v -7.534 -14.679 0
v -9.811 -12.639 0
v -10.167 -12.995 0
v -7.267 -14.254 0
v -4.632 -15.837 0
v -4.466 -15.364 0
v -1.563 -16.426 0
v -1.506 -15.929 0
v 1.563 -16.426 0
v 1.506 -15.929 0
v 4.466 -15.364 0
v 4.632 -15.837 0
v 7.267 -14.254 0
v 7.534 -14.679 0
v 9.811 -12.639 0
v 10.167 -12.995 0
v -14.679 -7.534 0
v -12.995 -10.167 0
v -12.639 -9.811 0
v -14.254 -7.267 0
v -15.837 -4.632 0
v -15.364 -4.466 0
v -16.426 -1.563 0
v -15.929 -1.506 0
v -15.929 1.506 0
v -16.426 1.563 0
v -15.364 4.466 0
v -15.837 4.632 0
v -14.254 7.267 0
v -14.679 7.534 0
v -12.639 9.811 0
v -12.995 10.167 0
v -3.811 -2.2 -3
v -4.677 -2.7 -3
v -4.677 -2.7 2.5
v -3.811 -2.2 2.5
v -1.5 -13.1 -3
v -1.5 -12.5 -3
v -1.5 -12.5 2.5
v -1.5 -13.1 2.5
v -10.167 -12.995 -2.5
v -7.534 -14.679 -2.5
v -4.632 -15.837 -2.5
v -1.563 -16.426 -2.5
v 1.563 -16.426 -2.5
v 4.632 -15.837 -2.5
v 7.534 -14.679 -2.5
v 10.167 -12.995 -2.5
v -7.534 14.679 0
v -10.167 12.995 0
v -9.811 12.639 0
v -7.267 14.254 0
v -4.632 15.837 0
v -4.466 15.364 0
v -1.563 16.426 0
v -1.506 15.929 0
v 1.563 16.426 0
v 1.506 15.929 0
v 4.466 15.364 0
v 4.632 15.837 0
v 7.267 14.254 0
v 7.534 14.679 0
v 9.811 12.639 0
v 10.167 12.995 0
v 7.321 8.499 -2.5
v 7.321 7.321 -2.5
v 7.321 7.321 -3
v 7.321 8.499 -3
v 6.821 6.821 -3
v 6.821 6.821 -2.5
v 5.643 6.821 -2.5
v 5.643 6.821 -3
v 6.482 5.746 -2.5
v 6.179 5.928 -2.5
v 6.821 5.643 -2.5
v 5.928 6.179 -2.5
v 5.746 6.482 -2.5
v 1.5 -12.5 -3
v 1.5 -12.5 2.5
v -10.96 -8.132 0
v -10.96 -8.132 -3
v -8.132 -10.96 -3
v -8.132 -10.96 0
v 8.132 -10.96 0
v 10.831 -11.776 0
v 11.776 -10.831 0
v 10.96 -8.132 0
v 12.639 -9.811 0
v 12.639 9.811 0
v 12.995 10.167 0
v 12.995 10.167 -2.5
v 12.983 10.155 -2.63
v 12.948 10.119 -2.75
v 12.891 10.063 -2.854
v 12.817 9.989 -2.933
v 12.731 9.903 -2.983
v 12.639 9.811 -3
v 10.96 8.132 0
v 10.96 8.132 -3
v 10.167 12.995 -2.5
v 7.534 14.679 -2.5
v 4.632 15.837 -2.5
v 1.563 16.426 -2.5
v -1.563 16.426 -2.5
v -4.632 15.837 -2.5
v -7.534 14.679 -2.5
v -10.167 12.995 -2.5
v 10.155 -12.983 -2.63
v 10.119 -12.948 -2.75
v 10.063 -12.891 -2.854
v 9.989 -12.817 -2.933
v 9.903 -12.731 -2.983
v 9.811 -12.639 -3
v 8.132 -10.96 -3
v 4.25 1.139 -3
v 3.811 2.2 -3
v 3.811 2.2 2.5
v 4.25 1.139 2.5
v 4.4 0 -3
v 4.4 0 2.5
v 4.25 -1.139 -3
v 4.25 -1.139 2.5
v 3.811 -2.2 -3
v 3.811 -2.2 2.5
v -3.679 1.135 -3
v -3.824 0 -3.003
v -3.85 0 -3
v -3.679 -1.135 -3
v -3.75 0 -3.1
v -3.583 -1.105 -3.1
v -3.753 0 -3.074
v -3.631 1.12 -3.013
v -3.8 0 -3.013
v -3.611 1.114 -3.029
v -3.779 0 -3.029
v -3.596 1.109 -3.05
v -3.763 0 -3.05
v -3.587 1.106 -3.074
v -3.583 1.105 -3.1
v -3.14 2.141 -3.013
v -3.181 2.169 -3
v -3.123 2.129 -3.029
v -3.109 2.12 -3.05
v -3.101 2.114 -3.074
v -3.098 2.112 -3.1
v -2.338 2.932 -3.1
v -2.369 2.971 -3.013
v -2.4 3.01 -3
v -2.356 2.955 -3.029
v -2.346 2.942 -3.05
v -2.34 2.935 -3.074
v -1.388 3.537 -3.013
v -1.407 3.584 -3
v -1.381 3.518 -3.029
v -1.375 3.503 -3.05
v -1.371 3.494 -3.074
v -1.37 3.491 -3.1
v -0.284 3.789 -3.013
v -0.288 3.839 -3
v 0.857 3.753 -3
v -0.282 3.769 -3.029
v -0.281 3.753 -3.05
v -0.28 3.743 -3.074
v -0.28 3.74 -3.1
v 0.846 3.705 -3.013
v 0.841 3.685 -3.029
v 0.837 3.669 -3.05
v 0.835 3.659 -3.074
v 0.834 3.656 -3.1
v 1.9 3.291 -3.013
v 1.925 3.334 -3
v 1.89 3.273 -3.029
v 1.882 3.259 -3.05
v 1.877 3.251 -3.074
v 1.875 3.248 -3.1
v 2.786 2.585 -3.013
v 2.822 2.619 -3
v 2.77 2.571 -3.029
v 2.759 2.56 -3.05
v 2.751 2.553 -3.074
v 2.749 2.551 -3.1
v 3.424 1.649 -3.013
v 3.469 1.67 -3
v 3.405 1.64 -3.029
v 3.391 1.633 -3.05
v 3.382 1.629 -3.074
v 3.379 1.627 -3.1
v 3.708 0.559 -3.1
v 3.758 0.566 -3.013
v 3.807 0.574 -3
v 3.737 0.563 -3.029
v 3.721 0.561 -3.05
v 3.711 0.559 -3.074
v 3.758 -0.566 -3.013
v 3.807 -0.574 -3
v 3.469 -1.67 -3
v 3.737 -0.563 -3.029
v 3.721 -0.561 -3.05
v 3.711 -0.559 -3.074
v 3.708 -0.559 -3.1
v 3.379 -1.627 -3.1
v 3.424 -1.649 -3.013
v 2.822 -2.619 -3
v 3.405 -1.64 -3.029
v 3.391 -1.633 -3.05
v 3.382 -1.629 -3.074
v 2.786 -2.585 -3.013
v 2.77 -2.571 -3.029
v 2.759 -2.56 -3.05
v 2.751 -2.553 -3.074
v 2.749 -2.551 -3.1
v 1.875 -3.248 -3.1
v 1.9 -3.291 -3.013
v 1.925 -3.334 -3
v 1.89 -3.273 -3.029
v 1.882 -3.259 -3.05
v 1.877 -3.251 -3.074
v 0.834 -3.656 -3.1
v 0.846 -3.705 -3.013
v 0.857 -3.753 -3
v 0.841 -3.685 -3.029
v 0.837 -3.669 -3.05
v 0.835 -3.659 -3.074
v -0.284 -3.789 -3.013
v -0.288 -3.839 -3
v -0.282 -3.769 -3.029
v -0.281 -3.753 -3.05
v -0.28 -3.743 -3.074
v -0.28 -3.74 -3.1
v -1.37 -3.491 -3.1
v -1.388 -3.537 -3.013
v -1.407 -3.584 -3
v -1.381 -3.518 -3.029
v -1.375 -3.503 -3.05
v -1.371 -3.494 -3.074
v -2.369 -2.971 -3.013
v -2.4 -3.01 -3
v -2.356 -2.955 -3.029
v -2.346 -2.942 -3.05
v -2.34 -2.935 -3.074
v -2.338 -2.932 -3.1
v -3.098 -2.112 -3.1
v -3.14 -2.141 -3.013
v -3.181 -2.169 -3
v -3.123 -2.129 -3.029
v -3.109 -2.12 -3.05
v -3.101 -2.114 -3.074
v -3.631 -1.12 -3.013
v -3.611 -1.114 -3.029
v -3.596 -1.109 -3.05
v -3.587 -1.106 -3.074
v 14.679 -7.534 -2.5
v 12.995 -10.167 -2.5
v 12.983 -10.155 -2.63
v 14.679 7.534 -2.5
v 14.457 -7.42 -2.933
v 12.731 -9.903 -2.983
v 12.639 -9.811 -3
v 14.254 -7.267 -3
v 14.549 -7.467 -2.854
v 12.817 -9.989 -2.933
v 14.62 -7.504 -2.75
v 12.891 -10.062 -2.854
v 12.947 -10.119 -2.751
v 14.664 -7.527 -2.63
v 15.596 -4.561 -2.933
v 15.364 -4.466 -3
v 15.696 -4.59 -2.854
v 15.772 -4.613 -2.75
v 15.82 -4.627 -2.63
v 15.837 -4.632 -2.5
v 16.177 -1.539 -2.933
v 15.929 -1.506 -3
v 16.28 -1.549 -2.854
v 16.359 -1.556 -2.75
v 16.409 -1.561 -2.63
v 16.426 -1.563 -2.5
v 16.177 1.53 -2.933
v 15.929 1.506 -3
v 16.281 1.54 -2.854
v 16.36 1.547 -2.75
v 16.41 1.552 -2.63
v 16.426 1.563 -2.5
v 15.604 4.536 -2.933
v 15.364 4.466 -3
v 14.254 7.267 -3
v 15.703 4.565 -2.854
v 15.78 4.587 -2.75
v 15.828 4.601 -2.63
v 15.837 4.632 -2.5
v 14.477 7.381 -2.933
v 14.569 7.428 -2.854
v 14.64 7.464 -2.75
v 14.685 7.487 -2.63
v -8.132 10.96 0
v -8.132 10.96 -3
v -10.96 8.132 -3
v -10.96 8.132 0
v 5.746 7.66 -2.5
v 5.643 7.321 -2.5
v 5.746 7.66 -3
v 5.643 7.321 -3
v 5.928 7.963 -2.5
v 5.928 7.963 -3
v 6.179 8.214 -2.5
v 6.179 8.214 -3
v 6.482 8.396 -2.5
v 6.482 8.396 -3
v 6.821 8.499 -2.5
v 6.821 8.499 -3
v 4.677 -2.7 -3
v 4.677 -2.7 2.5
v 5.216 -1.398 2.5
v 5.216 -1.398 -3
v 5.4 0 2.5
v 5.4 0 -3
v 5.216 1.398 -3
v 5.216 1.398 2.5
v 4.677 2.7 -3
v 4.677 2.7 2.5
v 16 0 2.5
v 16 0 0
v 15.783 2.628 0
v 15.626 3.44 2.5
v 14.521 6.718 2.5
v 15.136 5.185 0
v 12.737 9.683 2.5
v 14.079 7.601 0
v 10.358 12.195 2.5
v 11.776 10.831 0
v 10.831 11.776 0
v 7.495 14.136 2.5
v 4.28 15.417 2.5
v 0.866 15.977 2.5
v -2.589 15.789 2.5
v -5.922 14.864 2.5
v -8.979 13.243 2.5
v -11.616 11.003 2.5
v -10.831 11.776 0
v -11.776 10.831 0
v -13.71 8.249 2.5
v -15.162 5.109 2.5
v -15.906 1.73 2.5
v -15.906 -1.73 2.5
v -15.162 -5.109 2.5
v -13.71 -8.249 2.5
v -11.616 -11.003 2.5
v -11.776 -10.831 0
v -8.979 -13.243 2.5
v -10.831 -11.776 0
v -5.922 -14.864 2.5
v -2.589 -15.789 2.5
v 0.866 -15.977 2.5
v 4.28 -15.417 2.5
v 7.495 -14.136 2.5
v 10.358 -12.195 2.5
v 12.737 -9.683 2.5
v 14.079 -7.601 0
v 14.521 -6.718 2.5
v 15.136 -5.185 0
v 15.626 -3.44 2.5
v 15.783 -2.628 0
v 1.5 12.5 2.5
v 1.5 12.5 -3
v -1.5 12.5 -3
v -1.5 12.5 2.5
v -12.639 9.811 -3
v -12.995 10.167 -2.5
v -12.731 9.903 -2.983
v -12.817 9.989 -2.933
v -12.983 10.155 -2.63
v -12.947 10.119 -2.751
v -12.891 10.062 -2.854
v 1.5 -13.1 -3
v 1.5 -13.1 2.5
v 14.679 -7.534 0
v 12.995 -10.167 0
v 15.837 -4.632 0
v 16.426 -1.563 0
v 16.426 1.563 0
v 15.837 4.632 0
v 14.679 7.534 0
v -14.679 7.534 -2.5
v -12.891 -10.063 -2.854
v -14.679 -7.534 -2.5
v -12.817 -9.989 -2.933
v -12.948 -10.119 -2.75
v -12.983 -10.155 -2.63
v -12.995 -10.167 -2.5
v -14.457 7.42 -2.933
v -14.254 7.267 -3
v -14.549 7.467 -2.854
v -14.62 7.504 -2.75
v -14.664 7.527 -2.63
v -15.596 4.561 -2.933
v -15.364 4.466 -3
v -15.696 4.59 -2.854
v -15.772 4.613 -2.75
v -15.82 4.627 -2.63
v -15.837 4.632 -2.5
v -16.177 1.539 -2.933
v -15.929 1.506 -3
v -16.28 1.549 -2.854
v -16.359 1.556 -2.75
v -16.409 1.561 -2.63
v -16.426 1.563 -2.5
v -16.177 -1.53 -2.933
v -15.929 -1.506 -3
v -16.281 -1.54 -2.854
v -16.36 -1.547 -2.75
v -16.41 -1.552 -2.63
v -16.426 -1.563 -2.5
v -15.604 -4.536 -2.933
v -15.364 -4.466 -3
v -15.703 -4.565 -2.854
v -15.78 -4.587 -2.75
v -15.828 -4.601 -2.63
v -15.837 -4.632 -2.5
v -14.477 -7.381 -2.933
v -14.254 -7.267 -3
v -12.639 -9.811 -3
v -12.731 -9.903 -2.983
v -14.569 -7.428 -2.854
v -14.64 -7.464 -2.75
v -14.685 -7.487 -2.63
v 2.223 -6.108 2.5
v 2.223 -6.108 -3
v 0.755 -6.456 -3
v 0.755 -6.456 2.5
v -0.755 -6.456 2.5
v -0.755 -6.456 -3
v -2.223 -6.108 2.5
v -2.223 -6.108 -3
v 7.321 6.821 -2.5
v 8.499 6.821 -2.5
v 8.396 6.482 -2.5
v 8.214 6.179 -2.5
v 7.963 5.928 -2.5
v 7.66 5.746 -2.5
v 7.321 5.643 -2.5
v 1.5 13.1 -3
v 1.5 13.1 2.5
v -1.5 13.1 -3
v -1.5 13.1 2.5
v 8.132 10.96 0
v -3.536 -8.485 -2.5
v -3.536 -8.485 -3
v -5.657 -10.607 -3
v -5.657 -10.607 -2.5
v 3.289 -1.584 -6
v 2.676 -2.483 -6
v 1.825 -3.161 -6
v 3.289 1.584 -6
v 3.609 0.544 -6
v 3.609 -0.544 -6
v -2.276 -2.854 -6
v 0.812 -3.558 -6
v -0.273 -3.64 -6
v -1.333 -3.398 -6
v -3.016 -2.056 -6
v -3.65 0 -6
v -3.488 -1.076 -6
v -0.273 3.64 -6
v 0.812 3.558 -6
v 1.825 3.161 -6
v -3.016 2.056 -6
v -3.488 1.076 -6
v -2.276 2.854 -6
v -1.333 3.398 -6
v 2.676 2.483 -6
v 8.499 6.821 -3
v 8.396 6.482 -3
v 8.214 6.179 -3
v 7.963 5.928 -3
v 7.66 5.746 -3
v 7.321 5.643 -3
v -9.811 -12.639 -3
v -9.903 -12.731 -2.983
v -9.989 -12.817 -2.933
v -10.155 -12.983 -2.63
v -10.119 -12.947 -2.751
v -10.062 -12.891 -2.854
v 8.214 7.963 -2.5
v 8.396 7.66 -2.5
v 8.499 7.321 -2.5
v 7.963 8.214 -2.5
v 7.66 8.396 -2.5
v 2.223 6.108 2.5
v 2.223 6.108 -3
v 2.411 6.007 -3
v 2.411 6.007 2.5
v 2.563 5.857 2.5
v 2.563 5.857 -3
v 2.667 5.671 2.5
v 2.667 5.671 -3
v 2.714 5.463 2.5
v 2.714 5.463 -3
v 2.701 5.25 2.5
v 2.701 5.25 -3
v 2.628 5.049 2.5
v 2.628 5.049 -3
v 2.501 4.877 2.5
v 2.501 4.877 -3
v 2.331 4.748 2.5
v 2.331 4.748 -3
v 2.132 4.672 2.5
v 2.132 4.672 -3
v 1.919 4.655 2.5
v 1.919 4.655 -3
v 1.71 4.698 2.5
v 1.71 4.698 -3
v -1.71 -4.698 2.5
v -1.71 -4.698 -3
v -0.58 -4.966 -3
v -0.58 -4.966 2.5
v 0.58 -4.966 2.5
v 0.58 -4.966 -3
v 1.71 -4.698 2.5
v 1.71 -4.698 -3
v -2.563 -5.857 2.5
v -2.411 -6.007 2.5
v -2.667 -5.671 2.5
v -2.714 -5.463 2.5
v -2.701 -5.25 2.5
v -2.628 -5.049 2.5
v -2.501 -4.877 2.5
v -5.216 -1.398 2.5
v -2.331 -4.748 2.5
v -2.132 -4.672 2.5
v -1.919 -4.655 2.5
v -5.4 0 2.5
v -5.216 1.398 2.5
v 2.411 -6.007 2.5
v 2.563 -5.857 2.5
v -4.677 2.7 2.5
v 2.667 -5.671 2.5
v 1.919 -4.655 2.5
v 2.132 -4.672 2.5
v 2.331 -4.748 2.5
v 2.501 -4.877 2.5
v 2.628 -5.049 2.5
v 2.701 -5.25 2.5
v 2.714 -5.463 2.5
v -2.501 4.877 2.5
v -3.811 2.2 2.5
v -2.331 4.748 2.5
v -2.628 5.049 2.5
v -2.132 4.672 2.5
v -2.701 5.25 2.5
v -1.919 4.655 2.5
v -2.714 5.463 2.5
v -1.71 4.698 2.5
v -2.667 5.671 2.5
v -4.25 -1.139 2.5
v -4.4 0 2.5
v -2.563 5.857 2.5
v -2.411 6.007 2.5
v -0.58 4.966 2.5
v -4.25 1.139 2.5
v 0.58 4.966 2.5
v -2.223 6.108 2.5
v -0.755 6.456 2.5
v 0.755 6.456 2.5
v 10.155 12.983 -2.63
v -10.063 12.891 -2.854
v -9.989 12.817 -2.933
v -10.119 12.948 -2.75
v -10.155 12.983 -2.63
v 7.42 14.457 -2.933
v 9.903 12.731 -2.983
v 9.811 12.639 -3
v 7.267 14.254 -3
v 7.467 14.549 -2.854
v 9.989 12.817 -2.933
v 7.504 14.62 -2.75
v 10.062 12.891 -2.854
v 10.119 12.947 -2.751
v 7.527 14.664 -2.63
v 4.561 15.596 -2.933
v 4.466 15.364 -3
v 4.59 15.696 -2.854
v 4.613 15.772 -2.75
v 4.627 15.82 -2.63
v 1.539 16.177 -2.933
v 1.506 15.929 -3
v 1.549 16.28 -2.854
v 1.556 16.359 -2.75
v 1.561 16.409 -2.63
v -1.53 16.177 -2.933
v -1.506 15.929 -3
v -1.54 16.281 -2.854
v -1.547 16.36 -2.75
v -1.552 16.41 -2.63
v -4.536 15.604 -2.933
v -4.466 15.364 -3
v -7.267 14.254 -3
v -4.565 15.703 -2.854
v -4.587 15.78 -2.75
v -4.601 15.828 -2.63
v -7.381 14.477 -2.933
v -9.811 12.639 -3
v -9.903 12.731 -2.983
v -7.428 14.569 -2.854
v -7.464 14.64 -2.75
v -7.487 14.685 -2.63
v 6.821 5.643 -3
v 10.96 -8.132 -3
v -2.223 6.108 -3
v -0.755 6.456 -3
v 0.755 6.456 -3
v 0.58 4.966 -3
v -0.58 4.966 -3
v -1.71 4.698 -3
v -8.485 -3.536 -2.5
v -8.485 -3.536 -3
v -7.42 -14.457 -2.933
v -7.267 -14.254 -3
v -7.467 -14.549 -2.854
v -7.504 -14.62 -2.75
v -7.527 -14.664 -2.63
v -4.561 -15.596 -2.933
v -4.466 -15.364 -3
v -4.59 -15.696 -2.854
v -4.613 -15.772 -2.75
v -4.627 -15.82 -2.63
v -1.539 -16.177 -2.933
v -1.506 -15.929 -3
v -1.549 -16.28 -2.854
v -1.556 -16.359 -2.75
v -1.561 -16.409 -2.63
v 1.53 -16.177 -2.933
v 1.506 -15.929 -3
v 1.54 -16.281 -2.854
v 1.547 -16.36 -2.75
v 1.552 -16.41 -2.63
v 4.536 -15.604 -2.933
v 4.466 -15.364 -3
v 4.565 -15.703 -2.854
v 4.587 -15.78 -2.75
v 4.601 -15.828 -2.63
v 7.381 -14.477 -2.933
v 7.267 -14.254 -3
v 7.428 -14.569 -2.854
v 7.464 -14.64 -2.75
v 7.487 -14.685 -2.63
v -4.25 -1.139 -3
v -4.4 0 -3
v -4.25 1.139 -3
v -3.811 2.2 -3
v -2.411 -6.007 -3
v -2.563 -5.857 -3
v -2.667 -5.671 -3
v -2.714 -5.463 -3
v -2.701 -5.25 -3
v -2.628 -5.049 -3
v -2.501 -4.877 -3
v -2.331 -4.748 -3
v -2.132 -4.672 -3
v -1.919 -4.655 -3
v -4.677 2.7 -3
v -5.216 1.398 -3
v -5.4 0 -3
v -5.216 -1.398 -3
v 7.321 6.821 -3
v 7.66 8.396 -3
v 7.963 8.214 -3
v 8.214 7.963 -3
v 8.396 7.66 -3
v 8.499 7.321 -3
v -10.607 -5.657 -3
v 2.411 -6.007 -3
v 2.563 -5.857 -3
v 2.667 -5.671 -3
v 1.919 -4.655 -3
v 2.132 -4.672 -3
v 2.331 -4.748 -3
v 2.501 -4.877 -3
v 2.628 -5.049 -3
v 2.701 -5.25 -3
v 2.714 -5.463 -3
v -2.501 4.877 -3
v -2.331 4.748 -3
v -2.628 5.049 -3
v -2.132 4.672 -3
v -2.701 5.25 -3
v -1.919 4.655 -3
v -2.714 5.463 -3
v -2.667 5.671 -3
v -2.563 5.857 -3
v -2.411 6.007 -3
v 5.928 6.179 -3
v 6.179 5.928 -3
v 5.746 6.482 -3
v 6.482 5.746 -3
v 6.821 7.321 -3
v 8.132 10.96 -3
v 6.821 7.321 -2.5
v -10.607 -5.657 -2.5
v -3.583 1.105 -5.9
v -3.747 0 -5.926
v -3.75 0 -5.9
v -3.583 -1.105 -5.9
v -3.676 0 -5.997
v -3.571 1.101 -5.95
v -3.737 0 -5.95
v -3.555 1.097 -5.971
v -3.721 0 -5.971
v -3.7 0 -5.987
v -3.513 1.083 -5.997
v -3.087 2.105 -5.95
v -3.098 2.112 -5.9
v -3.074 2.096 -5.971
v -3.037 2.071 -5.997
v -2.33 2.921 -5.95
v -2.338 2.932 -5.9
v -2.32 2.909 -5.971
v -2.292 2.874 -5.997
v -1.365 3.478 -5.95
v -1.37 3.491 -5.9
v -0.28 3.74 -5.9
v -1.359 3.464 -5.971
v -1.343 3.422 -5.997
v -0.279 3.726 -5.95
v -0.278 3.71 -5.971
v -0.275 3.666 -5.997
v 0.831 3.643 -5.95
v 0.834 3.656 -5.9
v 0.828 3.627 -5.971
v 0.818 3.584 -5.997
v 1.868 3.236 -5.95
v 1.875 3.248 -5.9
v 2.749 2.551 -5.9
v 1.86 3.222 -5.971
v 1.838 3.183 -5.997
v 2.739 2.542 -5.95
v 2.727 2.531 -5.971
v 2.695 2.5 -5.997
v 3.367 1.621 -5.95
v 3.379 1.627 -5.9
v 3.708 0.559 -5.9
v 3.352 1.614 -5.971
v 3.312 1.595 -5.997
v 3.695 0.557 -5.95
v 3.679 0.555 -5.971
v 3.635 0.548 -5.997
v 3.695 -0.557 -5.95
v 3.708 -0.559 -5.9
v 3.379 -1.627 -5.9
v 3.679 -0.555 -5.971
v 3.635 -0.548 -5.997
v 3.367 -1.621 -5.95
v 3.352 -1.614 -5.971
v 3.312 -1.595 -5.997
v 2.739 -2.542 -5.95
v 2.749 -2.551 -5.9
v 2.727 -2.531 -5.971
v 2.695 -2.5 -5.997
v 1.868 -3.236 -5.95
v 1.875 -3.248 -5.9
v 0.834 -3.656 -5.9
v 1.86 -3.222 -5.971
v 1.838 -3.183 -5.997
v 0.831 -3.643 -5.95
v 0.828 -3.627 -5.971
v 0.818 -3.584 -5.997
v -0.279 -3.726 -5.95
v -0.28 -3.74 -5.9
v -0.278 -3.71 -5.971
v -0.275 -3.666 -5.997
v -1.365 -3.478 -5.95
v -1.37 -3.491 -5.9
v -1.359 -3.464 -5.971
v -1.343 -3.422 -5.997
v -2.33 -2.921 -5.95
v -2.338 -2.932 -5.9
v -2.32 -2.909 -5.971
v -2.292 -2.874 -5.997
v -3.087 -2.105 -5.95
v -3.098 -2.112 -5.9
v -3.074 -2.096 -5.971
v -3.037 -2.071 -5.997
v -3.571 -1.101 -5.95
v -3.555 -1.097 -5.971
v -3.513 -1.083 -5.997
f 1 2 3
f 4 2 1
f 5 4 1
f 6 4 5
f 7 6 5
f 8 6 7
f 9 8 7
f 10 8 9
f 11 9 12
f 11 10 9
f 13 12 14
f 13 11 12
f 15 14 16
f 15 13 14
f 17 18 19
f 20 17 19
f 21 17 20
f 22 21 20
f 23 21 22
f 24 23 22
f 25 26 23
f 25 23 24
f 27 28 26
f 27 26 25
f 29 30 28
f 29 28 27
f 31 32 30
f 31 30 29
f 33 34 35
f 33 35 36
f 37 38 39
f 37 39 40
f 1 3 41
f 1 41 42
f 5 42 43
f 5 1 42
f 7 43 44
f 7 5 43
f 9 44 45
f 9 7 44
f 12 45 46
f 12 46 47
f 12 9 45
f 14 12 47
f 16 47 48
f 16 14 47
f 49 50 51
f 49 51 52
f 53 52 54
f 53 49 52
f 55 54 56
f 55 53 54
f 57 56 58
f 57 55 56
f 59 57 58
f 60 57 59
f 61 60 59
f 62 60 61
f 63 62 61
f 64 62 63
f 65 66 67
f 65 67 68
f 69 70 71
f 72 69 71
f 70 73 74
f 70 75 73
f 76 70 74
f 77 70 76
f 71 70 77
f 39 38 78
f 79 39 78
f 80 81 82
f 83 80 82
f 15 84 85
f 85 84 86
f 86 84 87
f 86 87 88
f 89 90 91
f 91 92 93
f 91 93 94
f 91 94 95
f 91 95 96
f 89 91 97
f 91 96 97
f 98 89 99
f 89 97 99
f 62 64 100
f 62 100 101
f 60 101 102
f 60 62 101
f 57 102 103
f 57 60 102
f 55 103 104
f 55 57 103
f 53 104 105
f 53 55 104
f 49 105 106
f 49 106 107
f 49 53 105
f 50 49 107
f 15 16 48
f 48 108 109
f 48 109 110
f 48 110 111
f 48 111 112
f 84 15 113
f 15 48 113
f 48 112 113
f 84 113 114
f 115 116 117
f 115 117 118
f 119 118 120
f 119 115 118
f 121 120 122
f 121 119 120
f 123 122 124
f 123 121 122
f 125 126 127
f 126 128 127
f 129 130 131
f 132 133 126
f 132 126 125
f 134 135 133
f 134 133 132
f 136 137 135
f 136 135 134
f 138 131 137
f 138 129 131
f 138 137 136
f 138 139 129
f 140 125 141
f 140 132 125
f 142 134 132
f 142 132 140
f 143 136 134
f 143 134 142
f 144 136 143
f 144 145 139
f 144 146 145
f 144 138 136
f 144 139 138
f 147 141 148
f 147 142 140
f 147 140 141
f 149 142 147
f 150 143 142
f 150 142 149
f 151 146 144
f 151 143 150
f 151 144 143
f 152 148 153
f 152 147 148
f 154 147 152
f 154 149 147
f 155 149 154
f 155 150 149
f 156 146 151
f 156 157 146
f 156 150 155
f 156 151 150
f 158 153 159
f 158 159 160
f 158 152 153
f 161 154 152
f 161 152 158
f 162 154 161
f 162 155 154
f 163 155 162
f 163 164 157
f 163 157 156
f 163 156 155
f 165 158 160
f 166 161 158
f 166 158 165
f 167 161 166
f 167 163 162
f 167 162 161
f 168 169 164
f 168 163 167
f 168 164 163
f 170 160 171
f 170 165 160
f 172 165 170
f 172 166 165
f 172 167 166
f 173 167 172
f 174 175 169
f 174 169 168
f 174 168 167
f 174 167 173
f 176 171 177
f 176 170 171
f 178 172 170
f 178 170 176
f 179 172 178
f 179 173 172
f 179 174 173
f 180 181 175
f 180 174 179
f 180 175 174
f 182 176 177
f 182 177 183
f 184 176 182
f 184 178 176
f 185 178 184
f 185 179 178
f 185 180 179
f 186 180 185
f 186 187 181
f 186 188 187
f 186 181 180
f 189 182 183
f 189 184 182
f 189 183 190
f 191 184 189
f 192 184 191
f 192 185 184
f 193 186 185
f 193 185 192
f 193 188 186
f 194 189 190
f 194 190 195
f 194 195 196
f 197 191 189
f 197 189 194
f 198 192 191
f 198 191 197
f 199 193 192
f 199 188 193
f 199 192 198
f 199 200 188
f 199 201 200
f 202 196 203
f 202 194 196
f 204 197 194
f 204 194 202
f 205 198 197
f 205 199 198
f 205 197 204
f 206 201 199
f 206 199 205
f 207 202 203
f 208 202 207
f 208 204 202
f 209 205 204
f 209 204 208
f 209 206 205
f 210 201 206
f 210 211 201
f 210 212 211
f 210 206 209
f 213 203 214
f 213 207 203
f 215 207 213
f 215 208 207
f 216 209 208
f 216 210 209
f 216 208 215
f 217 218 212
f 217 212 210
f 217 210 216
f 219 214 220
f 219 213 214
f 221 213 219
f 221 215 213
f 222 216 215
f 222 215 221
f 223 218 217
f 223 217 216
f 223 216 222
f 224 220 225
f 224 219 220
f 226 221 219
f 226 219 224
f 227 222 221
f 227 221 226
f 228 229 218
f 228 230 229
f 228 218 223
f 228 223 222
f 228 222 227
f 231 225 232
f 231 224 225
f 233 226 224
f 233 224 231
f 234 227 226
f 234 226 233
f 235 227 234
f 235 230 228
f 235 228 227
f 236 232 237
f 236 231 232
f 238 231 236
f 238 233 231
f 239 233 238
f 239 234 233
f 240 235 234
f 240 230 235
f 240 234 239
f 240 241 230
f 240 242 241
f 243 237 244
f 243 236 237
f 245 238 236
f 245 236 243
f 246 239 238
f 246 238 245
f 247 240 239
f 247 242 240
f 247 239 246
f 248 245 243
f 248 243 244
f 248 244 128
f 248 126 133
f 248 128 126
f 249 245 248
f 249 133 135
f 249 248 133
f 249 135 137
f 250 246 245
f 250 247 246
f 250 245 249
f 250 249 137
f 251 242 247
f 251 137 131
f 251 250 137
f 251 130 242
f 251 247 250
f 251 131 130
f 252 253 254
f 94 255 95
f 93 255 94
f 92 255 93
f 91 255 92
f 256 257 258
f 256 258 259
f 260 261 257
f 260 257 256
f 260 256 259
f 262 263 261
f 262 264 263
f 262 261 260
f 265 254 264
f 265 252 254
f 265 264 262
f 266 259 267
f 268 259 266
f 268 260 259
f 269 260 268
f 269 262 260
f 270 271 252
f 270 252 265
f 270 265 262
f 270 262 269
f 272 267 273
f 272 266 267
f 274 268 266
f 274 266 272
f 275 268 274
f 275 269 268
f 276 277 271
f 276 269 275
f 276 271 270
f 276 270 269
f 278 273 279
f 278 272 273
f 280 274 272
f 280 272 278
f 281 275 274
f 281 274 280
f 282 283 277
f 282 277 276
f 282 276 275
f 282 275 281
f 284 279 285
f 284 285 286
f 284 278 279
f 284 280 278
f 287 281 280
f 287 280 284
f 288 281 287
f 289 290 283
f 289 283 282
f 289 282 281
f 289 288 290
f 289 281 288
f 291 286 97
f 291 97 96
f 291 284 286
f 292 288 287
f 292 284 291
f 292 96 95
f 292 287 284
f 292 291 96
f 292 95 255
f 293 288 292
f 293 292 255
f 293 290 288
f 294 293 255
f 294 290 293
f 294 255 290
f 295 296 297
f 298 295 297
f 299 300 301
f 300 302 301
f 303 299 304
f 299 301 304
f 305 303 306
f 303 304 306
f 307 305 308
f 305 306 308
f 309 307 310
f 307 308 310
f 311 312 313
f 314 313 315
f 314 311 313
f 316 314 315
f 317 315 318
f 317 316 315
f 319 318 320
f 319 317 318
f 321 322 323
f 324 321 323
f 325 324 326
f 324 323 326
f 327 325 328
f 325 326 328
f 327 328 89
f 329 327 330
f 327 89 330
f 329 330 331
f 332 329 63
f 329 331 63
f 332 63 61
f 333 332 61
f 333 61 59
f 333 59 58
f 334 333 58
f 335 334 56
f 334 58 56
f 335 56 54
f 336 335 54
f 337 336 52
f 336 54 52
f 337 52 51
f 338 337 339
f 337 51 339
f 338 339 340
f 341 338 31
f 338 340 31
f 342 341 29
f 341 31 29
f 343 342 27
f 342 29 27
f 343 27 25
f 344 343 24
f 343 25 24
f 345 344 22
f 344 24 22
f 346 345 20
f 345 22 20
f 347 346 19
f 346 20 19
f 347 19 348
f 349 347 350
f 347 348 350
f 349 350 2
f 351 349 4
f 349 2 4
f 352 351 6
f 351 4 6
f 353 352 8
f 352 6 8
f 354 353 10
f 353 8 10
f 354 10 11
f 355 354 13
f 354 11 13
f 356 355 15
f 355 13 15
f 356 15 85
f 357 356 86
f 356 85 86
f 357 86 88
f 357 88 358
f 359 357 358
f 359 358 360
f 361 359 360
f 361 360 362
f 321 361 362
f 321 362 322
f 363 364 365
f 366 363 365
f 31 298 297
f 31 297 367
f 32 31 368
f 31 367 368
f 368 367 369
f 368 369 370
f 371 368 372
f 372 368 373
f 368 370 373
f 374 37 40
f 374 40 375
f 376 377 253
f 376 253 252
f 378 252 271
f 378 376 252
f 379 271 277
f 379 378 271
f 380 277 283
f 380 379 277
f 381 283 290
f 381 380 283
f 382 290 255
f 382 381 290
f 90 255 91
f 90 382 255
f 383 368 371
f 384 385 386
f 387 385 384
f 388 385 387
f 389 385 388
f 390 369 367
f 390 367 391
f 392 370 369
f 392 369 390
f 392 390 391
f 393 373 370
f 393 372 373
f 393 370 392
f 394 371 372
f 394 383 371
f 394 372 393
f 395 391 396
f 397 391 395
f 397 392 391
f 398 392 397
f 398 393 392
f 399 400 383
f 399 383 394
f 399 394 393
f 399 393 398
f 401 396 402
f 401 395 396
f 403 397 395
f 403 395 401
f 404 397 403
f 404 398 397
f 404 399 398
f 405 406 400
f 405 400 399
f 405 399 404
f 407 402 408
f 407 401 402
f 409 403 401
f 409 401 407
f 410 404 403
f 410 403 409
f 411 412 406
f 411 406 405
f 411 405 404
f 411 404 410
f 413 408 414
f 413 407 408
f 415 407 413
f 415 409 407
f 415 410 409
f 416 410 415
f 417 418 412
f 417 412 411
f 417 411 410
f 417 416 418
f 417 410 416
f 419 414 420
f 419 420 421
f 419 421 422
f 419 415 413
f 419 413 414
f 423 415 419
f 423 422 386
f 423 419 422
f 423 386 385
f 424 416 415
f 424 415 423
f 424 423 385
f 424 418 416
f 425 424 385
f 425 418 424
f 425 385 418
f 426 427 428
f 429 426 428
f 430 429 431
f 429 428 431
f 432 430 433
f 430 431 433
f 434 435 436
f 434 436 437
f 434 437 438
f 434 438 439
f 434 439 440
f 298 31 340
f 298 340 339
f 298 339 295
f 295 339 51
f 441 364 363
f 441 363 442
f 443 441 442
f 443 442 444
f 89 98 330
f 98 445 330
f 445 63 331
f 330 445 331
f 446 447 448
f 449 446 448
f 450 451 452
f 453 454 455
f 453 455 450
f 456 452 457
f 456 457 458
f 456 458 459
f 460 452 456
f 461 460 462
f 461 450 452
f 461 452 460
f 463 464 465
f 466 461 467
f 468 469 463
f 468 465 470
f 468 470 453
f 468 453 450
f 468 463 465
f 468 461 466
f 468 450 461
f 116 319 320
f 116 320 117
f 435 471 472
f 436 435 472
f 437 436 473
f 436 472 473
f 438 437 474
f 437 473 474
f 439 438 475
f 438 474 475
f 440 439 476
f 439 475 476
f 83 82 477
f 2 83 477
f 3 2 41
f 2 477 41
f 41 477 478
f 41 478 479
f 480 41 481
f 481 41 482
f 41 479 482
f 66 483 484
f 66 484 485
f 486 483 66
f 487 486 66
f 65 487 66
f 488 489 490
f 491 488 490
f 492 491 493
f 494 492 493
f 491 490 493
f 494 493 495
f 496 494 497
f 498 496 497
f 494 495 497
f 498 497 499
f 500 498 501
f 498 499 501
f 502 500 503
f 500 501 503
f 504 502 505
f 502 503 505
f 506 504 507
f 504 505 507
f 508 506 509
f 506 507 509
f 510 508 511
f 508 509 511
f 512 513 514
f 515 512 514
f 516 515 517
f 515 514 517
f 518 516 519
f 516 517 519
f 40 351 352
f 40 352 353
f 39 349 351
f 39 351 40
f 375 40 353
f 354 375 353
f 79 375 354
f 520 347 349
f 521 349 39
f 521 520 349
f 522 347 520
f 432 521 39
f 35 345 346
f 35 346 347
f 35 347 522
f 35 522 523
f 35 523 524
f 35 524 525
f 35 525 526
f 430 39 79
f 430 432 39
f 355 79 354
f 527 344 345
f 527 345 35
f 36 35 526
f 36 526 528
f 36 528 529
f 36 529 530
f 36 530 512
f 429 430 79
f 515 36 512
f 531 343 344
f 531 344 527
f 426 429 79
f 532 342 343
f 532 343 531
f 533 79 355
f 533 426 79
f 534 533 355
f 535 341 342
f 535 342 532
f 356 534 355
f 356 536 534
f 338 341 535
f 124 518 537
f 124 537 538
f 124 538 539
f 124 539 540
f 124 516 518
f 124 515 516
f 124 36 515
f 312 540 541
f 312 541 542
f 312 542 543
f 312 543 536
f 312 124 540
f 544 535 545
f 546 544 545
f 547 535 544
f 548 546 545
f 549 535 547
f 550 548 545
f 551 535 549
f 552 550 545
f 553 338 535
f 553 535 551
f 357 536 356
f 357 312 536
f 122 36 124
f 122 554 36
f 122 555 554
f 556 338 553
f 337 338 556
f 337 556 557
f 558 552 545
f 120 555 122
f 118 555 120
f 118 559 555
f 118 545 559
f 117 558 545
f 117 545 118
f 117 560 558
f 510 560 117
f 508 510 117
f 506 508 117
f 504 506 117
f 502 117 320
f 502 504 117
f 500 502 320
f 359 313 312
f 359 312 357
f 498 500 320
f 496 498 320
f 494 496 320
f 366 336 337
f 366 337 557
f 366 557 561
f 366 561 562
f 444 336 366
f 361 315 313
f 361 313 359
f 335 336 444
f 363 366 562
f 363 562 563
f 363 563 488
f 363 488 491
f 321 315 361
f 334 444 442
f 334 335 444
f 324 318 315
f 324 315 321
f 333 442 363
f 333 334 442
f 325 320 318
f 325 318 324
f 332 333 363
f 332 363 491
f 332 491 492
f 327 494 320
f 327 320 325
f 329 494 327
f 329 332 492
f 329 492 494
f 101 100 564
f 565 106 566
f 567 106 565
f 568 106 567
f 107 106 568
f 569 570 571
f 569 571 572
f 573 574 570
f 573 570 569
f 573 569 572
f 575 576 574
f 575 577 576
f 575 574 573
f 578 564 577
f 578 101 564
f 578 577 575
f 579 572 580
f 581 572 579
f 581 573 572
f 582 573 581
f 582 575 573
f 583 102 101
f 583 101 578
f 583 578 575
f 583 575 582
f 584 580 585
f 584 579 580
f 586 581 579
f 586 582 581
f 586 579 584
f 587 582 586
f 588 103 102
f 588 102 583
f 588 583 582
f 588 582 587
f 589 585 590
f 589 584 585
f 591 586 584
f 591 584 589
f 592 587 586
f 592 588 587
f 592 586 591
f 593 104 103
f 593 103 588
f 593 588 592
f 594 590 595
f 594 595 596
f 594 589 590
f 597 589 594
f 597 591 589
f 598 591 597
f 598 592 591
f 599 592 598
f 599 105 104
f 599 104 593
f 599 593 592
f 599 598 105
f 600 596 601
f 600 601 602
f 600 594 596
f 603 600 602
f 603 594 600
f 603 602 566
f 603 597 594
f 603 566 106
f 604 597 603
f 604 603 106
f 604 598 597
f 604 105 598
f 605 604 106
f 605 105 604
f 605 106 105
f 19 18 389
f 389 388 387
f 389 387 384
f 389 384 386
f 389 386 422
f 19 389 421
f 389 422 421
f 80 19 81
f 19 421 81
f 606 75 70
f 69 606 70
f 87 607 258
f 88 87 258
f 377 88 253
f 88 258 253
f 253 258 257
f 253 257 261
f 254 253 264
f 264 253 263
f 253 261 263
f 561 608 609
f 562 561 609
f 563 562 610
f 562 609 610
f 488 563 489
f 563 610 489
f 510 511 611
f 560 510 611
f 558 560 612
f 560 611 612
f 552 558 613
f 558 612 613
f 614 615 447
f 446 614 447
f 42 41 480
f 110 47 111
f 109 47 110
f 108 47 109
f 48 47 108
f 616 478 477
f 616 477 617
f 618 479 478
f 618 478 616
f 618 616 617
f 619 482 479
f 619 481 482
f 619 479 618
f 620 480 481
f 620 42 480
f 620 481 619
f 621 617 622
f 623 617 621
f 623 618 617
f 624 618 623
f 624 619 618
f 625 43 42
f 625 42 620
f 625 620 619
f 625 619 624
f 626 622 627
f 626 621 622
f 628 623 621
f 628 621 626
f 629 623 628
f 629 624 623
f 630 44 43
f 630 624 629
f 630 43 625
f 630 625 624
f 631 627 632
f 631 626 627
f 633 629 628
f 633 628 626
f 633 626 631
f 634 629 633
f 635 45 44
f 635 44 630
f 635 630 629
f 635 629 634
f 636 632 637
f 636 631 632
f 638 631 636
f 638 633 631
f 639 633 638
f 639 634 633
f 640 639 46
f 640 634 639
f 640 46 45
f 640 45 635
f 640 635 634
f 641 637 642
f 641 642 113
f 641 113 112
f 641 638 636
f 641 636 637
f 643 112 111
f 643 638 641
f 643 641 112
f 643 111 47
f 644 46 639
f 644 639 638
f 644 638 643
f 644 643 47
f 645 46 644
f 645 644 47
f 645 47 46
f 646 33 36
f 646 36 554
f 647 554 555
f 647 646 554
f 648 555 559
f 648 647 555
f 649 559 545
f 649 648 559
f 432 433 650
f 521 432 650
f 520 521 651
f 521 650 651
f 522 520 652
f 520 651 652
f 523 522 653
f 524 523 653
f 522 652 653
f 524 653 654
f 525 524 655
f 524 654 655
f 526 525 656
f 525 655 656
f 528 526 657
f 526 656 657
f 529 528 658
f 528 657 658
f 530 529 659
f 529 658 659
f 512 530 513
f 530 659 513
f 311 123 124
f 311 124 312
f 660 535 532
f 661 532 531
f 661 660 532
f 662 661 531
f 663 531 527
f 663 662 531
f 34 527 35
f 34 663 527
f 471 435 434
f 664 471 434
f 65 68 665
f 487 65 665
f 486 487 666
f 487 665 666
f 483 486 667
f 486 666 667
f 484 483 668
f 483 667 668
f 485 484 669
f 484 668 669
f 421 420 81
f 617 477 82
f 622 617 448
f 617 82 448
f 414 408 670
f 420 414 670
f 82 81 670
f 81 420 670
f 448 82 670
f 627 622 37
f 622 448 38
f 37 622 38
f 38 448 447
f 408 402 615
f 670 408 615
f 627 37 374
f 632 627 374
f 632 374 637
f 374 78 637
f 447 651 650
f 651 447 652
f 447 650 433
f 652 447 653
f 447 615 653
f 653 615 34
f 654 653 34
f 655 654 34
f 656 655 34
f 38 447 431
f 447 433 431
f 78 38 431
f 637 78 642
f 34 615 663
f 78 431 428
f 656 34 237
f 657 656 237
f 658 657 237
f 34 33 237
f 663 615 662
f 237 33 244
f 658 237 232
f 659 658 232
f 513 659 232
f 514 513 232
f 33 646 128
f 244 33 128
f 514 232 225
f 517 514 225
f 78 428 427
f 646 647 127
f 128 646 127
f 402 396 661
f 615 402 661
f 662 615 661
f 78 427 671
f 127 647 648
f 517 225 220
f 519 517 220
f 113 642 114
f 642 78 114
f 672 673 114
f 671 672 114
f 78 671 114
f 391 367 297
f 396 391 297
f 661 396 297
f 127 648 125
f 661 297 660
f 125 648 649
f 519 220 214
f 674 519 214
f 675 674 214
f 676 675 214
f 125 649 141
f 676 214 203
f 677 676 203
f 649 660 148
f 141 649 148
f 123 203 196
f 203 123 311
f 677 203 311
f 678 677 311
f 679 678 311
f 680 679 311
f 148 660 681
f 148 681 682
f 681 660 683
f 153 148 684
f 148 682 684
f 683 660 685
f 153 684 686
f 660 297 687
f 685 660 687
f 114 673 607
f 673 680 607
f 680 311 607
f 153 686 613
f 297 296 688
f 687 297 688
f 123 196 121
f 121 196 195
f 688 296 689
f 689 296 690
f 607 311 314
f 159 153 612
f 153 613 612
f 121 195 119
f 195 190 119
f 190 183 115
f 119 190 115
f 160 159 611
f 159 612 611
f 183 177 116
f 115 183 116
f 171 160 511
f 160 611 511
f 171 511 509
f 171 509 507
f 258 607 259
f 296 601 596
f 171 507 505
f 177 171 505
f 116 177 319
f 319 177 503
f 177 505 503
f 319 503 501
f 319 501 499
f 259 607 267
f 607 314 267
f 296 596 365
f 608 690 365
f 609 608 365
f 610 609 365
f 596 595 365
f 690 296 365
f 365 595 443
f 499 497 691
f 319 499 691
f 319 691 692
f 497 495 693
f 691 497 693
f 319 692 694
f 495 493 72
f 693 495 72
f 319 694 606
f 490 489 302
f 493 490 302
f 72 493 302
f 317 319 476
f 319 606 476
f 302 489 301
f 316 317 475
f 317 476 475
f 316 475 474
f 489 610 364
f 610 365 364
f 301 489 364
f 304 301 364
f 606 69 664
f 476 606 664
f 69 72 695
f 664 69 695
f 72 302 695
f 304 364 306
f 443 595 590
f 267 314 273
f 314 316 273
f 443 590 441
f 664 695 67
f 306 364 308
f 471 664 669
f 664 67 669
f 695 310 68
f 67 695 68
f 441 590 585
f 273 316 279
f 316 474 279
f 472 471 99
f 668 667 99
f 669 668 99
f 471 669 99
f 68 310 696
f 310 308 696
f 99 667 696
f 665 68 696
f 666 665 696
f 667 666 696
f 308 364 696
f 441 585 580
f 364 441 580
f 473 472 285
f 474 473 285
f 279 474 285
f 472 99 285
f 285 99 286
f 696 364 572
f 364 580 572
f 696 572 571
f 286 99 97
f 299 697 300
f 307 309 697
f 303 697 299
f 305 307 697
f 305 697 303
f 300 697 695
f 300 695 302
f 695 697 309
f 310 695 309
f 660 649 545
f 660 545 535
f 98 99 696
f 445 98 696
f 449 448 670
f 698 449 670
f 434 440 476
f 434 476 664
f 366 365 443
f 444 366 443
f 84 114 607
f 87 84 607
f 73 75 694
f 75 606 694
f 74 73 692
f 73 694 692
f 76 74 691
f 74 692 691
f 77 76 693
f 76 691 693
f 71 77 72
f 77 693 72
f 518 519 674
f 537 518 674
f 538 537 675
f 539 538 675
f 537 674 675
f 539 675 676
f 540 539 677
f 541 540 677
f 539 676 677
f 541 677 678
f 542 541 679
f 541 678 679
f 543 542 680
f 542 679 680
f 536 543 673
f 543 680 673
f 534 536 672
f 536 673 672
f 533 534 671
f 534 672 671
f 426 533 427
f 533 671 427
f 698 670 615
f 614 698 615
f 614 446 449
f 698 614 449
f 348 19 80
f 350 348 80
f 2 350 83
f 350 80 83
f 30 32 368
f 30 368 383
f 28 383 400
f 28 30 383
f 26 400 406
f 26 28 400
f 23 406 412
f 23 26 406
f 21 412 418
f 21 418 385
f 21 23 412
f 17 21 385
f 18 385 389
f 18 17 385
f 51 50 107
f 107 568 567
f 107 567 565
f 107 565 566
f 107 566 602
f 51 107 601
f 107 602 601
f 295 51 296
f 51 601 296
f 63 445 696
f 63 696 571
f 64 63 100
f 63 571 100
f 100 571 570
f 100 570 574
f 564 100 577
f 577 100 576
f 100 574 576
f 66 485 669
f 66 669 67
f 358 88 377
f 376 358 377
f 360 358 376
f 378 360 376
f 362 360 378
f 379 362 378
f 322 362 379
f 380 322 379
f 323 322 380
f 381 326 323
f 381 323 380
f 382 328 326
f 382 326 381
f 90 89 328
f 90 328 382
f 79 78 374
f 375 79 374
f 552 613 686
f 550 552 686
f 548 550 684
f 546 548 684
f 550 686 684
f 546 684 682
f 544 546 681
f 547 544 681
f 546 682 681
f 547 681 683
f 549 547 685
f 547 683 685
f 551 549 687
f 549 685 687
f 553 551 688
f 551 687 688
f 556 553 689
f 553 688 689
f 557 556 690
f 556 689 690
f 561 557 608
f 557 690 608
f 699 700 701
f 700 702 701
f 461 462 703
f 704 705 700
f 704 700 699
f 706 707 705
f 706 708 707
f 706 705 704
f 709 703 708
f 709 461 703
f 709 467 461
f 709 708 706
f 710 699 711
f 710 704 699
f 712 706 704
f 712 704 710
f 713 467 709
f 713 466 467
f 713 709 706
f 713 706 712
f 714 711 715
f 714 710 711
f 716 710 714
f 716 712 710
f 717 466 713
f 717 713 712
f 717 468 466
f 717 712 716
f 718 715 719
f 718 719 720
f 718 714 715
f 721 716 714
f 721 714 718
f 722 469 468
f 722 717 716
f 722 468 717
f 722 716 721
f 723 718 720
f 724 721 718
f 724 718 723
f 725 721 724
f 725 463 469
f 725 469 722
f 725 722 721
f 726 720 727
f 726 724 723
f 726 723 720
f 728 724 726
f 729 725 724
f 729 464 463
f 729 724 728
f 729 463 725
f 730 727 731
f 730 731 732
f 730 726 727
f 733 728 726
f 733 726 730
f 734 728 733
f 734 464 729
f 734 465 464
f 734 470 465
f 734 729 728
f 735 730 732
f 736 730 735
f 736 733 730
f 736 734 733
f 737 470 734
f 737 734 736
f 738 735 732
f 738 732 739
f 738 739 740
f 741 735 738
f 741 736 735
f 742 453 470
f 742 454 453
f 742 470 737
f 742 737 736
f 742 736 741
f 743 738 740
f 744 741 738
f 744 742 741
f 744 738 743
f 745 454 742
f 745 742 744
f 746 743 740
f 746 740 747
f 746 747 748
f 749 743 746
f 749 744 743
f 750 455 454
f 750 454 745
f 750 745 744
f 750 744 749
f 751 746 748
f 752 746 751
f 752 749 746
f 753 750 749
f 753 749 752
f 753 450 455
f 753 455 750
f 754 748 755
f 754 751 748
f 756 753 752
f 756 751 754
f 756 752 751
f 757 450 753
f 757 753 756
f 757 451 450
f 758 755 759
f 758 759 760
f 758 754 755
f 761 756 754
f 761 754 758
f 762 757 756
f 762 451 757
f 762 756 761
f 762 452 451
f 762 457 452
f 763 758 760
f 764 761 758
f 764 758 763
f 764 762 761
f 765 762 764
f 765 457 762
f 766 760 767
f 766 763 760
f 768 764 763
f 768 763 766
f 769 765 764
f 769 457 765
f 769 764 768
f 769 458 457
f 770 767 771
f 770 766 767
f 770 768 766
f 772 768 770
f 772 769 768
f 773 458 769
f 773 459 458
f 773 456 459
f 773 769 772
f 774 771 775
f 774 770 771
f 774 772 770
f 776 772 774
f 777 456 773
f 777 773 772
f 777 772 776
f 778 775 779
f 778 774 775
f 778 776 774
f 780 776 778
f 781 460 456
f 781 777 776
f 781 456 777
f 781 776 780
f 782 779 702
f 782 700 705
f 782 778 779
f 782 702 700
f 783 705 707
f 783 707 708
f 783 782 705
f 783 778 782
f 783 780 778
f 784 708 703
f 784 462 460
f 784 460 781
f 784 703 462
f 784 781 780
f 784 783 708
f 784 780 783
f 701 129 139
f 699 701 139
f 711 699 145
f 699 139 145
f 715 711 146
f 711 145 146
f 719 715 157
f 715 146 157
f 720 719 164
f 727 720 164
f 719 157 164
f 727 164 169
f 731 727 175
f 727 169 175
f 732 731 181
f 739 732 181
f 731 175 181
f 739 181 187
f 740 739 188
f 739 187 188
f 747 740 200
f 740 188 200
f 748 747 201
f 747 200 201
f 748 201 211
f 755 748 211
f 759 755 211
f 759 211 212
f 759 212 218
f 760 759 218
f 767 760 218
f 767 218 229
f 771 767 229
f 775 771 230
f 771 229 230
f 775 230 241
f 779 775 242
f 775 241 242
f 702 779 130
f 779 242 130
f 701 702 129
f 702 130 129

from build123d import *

# Parameters (mm, degrees)
SKETCH1_R           = 16.5
BOSS_EXTRUDE1_DEPTH = 3
SKETCH2_R           = 3.75
BOSS_EXTRUDE2_DEPTH = 3
CUT_EXTRUDE1_DEPTH  = 4
CIRPATTERN1_COUNT   = 4
SKETCH4_R           = 16
BOSS_EXTRUDE3_DEPTH = 2.5
CUT_EXTRUDE2_DEPTH  = 6.5
CIRPATTERN2_COUNT   = 2
CUT_EXTRUDE3_DEPTH  = 6.5
CIRPATTERN3_COUNT   = 2
SKETCH8_R           = 1.45
CUT_EXTRUDE4_DEPTH  = 0.5
SKETCH9_W           = 0.5
SKETCH9_H           = 2.9
EXTRUDE_THIN1_DEPTH = 0.5
SKETCH10_W          = 2.9
SKETCH10_H          = 0.5
EXTRUDE_THIN2_DEPTH = 0.5
SKETCH11_W          = 3
SKETCH11_H          = 0.6
CUT_EXTRUDE5_DEPTH  = 6.5
CIRPATTERN4_COUNT   = 2
FILLET1_R           = 0.1
FILLET2_R           = 0.5


with BuildPart() as part:
    # Sketch1 → Boss-Extrude1 (new body)
    with BuildSketch(Plane.XY):
        Circle(SKETCH1_R)
    extrude(amount=-BOSS_EXTRUDE1_DEPTH)

    # Sketch2 → Boss-Extrude2 (add)
    with BuildSketch(Plane(origin=(0, 0, -3), x_dir=(-1, 0, 0), z_dir=(0, 0, -1))):
        Circle(SKETCH2_R)
    extrude(amount=BOSS_EXTRUDE2_DEPTH)

    # Sketch3 → Cut-Extrude1 (cut, through all)
    with BuildSketch(Plane(origin=(0, 0, -3), x_dir=(-1, 0, 0), z_dir=(0, 0, -1))):
        Polygon((10.253048327, 13.081475452), (8.131727984, 10.960155108), (10.960155108, 8.131727984), (13.081475452, 10.253048327), align=None)
    cut_extrude1 = extrude(amount=-CUT_EXTRUDE1_DEPTH, mode=Mode.SUBTRACT)

    # CirPattern1: Cut-Extrude1 ×4 about axis
    cirpattern1_axis = Axis((0, 0, 0), (0, 0, 1))
    for i in range(1, CIRPATTERN1_COUNT):
        add(cut_extrude1.rotate(cirpattern1_axis, i * 360 / CIRPATTERN1_COUNT), mode=Mode.SUBTRACT)

    # Sketch4 → Boss-Extrude3 (add)
    with BuildSketch(Plane.XY):
        Circle(SKETCH4_R)
    extrude(amount=BOSS_EXTRUDE3_DEPTH)

    # Sketch6 → Cut-Extrude2 (cut, through all)
    with BuildSketch(Plane(origin=(0, 0, -3), x_dir=(-1, 0, 0), z_dir=(0, 0, -1))):
        with BuildLine():
            Line((-4.67653718, 2.7), (-3.810511777, 2.2))
            ThreePointArc((-3.810511777, 2.2), (-4.4, 0), (-3.810511777, -2.2))
            Line((-3.810511777, -2.2), (-4.67653718, -2.7))
            ThreePointArc((-4.67653718, -2.7), (-5.4, 0), (-4.67653718, 2.7))
        make_face()
    cut_extrude2 = extrude(amount=-CUT_EXTRUDE2_DEPTH, mode=Mode.SUBTRACT)

    # CirPattern2: Cut-Extrude2 ×2 about axis
    cirpattern2_axis = Axis((0, 0, 0), (0, 0, 1))
    for i in range(1, CIRPATTERN2_COUNT):
        add(cut_extrude2.rotate(cirpattern2_axis, i * 360 / CIRPATTERN2_COUNT), mode=Mode.SUBTRACT)

    # Sketch7 → Cut-Extrude3 (cut, through all)
    with BuildSketch(Plane(origin=(0, 0, -3), x_dir=(-1, 0, 0), z_dir=(0, 0, -1))):
        with BuildLine():
            ThreePointArc((2.223130932, 6.108002035), (0, 6.5), (-2.223130932, 6.108002035))
            ThreePointArc((-2.223130932, 6.108002035), (-2.67138529, 5.146717462), (-1.710100717, 4.698463104))
            ThreePointArc((-1.710100717, 4.698463104), (0, 5), (1.710100717, 4.698463104))
            ThreePointArc((1.710100717, 4.698463104), (2.67138529, 5.146717462), (2.223130932, 6.108002035))
        make_face()
    cut_extrude3 = extrude(amount=-CUT_EXTRUDE3_DEPTH, mode=Mode.SUBTRACT)

    # CirPattern3: Cut-Extrude3 ×2 about axis
    cirpattern3_axis = Axis((0, 0, 0), (0, 0, 1))
    for i in range(1, CIRPATTERN3_COUNT):
        add(cut_extrude3.rotate(cirpattern3_axis, i * 360 / CIRPATTERN3_COUNT), mode=Mode.SUBTRACT)

    # Sketch8 → Cut-Extrude4 (cut)
    with BuildSketch(Plane(origin=(0, 0, -3), x_dir=(-1, 0, 0), z_dir=(0, 0, -1))):
        with Locations((-7.071067812, 7.071067812)):
            Circle(SKETCH8_R)
        Polygon((8.485281374, -3.535533906), (3.535533906, -8.485281374), (5.656854249, -10.606601718), (10.606601718, -5.656854249), align=None)
    extrude(amount=-CUT_EXTRUDE4_DEPTH, mode=Mode.SUBTRACT)

    # Sketch9 → Extrude-Thin1 (add)
    with BuildSketch(Plane(origin=(0, 0, -2.5), x_dir=(-1, 0, 0), z_dir=(0, 0, -1))):
        with Locations((-7.071067812, 7.071067812)):
            Rectangle(SKETCH9_W, SKETCH9_H)
    extrude(amount=EXTRUDE_THIN1_DEPTH)

    # Sketch10 → Extrude-Thin2 (add)
    with BuildSketch(Plane(origin=(0, 0, -2.5), x_dir=(-1, 0, 0), z_dir=(0, 0, -1))):
        with Locations((-7.071067812, 7.071067812)):
            Rectangle(SKETCH10_W, SKETCH10_H)
    extrude(amount=EXTRUDE_THIN2_DEPTH)

    # Sketch11 → Cut-Extrude5 (cut, through all)
    with BuildSketch(Plane(origin=(0, 0, -3), x_dir=(-1, 0, 0), z_dir=(0, 0, -1))):
        with Locations((0, 12.8)):
            Rectangle(SKETCH11_W, SKETCH11_H)
    cut_extrude5 = extrude(amount=-CUT_EXTRUDE5_DEPTH, mode=Mode.SUBTRACT)

    # CirPattern4: Cut-Extrude5 ×2 about axis
    cirpattern4_axis = Axis((0, 0, 0), (0, 0, 1))
    for i in range(1, CIRPATTERN4_COUNT):
        add(cut_extrude5.rotate(cirpattern4_axis, i * 360 / CIRPATTERN4_COUNT), mode=Mode.SUBTRACT)

    # Fillet1
    fillet1_edges = [part.edges().sort_by_distance(p)[0] for p in [
        (3.75, 0, -3),
        (3.75, 0, -6),
    ]]
    fillet(fillet1_edges, radius=FILLET1_R)

    # Fillet2
    fillet2_edges = [part.edges().sort_by_distance(p)[0] for p in [
        (-16.5, 0, -3),
        (0, -16.5, -3),
        (16.5, 0, -3),
        (0, 16.5, -3),
    ]]
    fillet(fillet2_edges, radius=FILLET2_R)


solid = part.part
